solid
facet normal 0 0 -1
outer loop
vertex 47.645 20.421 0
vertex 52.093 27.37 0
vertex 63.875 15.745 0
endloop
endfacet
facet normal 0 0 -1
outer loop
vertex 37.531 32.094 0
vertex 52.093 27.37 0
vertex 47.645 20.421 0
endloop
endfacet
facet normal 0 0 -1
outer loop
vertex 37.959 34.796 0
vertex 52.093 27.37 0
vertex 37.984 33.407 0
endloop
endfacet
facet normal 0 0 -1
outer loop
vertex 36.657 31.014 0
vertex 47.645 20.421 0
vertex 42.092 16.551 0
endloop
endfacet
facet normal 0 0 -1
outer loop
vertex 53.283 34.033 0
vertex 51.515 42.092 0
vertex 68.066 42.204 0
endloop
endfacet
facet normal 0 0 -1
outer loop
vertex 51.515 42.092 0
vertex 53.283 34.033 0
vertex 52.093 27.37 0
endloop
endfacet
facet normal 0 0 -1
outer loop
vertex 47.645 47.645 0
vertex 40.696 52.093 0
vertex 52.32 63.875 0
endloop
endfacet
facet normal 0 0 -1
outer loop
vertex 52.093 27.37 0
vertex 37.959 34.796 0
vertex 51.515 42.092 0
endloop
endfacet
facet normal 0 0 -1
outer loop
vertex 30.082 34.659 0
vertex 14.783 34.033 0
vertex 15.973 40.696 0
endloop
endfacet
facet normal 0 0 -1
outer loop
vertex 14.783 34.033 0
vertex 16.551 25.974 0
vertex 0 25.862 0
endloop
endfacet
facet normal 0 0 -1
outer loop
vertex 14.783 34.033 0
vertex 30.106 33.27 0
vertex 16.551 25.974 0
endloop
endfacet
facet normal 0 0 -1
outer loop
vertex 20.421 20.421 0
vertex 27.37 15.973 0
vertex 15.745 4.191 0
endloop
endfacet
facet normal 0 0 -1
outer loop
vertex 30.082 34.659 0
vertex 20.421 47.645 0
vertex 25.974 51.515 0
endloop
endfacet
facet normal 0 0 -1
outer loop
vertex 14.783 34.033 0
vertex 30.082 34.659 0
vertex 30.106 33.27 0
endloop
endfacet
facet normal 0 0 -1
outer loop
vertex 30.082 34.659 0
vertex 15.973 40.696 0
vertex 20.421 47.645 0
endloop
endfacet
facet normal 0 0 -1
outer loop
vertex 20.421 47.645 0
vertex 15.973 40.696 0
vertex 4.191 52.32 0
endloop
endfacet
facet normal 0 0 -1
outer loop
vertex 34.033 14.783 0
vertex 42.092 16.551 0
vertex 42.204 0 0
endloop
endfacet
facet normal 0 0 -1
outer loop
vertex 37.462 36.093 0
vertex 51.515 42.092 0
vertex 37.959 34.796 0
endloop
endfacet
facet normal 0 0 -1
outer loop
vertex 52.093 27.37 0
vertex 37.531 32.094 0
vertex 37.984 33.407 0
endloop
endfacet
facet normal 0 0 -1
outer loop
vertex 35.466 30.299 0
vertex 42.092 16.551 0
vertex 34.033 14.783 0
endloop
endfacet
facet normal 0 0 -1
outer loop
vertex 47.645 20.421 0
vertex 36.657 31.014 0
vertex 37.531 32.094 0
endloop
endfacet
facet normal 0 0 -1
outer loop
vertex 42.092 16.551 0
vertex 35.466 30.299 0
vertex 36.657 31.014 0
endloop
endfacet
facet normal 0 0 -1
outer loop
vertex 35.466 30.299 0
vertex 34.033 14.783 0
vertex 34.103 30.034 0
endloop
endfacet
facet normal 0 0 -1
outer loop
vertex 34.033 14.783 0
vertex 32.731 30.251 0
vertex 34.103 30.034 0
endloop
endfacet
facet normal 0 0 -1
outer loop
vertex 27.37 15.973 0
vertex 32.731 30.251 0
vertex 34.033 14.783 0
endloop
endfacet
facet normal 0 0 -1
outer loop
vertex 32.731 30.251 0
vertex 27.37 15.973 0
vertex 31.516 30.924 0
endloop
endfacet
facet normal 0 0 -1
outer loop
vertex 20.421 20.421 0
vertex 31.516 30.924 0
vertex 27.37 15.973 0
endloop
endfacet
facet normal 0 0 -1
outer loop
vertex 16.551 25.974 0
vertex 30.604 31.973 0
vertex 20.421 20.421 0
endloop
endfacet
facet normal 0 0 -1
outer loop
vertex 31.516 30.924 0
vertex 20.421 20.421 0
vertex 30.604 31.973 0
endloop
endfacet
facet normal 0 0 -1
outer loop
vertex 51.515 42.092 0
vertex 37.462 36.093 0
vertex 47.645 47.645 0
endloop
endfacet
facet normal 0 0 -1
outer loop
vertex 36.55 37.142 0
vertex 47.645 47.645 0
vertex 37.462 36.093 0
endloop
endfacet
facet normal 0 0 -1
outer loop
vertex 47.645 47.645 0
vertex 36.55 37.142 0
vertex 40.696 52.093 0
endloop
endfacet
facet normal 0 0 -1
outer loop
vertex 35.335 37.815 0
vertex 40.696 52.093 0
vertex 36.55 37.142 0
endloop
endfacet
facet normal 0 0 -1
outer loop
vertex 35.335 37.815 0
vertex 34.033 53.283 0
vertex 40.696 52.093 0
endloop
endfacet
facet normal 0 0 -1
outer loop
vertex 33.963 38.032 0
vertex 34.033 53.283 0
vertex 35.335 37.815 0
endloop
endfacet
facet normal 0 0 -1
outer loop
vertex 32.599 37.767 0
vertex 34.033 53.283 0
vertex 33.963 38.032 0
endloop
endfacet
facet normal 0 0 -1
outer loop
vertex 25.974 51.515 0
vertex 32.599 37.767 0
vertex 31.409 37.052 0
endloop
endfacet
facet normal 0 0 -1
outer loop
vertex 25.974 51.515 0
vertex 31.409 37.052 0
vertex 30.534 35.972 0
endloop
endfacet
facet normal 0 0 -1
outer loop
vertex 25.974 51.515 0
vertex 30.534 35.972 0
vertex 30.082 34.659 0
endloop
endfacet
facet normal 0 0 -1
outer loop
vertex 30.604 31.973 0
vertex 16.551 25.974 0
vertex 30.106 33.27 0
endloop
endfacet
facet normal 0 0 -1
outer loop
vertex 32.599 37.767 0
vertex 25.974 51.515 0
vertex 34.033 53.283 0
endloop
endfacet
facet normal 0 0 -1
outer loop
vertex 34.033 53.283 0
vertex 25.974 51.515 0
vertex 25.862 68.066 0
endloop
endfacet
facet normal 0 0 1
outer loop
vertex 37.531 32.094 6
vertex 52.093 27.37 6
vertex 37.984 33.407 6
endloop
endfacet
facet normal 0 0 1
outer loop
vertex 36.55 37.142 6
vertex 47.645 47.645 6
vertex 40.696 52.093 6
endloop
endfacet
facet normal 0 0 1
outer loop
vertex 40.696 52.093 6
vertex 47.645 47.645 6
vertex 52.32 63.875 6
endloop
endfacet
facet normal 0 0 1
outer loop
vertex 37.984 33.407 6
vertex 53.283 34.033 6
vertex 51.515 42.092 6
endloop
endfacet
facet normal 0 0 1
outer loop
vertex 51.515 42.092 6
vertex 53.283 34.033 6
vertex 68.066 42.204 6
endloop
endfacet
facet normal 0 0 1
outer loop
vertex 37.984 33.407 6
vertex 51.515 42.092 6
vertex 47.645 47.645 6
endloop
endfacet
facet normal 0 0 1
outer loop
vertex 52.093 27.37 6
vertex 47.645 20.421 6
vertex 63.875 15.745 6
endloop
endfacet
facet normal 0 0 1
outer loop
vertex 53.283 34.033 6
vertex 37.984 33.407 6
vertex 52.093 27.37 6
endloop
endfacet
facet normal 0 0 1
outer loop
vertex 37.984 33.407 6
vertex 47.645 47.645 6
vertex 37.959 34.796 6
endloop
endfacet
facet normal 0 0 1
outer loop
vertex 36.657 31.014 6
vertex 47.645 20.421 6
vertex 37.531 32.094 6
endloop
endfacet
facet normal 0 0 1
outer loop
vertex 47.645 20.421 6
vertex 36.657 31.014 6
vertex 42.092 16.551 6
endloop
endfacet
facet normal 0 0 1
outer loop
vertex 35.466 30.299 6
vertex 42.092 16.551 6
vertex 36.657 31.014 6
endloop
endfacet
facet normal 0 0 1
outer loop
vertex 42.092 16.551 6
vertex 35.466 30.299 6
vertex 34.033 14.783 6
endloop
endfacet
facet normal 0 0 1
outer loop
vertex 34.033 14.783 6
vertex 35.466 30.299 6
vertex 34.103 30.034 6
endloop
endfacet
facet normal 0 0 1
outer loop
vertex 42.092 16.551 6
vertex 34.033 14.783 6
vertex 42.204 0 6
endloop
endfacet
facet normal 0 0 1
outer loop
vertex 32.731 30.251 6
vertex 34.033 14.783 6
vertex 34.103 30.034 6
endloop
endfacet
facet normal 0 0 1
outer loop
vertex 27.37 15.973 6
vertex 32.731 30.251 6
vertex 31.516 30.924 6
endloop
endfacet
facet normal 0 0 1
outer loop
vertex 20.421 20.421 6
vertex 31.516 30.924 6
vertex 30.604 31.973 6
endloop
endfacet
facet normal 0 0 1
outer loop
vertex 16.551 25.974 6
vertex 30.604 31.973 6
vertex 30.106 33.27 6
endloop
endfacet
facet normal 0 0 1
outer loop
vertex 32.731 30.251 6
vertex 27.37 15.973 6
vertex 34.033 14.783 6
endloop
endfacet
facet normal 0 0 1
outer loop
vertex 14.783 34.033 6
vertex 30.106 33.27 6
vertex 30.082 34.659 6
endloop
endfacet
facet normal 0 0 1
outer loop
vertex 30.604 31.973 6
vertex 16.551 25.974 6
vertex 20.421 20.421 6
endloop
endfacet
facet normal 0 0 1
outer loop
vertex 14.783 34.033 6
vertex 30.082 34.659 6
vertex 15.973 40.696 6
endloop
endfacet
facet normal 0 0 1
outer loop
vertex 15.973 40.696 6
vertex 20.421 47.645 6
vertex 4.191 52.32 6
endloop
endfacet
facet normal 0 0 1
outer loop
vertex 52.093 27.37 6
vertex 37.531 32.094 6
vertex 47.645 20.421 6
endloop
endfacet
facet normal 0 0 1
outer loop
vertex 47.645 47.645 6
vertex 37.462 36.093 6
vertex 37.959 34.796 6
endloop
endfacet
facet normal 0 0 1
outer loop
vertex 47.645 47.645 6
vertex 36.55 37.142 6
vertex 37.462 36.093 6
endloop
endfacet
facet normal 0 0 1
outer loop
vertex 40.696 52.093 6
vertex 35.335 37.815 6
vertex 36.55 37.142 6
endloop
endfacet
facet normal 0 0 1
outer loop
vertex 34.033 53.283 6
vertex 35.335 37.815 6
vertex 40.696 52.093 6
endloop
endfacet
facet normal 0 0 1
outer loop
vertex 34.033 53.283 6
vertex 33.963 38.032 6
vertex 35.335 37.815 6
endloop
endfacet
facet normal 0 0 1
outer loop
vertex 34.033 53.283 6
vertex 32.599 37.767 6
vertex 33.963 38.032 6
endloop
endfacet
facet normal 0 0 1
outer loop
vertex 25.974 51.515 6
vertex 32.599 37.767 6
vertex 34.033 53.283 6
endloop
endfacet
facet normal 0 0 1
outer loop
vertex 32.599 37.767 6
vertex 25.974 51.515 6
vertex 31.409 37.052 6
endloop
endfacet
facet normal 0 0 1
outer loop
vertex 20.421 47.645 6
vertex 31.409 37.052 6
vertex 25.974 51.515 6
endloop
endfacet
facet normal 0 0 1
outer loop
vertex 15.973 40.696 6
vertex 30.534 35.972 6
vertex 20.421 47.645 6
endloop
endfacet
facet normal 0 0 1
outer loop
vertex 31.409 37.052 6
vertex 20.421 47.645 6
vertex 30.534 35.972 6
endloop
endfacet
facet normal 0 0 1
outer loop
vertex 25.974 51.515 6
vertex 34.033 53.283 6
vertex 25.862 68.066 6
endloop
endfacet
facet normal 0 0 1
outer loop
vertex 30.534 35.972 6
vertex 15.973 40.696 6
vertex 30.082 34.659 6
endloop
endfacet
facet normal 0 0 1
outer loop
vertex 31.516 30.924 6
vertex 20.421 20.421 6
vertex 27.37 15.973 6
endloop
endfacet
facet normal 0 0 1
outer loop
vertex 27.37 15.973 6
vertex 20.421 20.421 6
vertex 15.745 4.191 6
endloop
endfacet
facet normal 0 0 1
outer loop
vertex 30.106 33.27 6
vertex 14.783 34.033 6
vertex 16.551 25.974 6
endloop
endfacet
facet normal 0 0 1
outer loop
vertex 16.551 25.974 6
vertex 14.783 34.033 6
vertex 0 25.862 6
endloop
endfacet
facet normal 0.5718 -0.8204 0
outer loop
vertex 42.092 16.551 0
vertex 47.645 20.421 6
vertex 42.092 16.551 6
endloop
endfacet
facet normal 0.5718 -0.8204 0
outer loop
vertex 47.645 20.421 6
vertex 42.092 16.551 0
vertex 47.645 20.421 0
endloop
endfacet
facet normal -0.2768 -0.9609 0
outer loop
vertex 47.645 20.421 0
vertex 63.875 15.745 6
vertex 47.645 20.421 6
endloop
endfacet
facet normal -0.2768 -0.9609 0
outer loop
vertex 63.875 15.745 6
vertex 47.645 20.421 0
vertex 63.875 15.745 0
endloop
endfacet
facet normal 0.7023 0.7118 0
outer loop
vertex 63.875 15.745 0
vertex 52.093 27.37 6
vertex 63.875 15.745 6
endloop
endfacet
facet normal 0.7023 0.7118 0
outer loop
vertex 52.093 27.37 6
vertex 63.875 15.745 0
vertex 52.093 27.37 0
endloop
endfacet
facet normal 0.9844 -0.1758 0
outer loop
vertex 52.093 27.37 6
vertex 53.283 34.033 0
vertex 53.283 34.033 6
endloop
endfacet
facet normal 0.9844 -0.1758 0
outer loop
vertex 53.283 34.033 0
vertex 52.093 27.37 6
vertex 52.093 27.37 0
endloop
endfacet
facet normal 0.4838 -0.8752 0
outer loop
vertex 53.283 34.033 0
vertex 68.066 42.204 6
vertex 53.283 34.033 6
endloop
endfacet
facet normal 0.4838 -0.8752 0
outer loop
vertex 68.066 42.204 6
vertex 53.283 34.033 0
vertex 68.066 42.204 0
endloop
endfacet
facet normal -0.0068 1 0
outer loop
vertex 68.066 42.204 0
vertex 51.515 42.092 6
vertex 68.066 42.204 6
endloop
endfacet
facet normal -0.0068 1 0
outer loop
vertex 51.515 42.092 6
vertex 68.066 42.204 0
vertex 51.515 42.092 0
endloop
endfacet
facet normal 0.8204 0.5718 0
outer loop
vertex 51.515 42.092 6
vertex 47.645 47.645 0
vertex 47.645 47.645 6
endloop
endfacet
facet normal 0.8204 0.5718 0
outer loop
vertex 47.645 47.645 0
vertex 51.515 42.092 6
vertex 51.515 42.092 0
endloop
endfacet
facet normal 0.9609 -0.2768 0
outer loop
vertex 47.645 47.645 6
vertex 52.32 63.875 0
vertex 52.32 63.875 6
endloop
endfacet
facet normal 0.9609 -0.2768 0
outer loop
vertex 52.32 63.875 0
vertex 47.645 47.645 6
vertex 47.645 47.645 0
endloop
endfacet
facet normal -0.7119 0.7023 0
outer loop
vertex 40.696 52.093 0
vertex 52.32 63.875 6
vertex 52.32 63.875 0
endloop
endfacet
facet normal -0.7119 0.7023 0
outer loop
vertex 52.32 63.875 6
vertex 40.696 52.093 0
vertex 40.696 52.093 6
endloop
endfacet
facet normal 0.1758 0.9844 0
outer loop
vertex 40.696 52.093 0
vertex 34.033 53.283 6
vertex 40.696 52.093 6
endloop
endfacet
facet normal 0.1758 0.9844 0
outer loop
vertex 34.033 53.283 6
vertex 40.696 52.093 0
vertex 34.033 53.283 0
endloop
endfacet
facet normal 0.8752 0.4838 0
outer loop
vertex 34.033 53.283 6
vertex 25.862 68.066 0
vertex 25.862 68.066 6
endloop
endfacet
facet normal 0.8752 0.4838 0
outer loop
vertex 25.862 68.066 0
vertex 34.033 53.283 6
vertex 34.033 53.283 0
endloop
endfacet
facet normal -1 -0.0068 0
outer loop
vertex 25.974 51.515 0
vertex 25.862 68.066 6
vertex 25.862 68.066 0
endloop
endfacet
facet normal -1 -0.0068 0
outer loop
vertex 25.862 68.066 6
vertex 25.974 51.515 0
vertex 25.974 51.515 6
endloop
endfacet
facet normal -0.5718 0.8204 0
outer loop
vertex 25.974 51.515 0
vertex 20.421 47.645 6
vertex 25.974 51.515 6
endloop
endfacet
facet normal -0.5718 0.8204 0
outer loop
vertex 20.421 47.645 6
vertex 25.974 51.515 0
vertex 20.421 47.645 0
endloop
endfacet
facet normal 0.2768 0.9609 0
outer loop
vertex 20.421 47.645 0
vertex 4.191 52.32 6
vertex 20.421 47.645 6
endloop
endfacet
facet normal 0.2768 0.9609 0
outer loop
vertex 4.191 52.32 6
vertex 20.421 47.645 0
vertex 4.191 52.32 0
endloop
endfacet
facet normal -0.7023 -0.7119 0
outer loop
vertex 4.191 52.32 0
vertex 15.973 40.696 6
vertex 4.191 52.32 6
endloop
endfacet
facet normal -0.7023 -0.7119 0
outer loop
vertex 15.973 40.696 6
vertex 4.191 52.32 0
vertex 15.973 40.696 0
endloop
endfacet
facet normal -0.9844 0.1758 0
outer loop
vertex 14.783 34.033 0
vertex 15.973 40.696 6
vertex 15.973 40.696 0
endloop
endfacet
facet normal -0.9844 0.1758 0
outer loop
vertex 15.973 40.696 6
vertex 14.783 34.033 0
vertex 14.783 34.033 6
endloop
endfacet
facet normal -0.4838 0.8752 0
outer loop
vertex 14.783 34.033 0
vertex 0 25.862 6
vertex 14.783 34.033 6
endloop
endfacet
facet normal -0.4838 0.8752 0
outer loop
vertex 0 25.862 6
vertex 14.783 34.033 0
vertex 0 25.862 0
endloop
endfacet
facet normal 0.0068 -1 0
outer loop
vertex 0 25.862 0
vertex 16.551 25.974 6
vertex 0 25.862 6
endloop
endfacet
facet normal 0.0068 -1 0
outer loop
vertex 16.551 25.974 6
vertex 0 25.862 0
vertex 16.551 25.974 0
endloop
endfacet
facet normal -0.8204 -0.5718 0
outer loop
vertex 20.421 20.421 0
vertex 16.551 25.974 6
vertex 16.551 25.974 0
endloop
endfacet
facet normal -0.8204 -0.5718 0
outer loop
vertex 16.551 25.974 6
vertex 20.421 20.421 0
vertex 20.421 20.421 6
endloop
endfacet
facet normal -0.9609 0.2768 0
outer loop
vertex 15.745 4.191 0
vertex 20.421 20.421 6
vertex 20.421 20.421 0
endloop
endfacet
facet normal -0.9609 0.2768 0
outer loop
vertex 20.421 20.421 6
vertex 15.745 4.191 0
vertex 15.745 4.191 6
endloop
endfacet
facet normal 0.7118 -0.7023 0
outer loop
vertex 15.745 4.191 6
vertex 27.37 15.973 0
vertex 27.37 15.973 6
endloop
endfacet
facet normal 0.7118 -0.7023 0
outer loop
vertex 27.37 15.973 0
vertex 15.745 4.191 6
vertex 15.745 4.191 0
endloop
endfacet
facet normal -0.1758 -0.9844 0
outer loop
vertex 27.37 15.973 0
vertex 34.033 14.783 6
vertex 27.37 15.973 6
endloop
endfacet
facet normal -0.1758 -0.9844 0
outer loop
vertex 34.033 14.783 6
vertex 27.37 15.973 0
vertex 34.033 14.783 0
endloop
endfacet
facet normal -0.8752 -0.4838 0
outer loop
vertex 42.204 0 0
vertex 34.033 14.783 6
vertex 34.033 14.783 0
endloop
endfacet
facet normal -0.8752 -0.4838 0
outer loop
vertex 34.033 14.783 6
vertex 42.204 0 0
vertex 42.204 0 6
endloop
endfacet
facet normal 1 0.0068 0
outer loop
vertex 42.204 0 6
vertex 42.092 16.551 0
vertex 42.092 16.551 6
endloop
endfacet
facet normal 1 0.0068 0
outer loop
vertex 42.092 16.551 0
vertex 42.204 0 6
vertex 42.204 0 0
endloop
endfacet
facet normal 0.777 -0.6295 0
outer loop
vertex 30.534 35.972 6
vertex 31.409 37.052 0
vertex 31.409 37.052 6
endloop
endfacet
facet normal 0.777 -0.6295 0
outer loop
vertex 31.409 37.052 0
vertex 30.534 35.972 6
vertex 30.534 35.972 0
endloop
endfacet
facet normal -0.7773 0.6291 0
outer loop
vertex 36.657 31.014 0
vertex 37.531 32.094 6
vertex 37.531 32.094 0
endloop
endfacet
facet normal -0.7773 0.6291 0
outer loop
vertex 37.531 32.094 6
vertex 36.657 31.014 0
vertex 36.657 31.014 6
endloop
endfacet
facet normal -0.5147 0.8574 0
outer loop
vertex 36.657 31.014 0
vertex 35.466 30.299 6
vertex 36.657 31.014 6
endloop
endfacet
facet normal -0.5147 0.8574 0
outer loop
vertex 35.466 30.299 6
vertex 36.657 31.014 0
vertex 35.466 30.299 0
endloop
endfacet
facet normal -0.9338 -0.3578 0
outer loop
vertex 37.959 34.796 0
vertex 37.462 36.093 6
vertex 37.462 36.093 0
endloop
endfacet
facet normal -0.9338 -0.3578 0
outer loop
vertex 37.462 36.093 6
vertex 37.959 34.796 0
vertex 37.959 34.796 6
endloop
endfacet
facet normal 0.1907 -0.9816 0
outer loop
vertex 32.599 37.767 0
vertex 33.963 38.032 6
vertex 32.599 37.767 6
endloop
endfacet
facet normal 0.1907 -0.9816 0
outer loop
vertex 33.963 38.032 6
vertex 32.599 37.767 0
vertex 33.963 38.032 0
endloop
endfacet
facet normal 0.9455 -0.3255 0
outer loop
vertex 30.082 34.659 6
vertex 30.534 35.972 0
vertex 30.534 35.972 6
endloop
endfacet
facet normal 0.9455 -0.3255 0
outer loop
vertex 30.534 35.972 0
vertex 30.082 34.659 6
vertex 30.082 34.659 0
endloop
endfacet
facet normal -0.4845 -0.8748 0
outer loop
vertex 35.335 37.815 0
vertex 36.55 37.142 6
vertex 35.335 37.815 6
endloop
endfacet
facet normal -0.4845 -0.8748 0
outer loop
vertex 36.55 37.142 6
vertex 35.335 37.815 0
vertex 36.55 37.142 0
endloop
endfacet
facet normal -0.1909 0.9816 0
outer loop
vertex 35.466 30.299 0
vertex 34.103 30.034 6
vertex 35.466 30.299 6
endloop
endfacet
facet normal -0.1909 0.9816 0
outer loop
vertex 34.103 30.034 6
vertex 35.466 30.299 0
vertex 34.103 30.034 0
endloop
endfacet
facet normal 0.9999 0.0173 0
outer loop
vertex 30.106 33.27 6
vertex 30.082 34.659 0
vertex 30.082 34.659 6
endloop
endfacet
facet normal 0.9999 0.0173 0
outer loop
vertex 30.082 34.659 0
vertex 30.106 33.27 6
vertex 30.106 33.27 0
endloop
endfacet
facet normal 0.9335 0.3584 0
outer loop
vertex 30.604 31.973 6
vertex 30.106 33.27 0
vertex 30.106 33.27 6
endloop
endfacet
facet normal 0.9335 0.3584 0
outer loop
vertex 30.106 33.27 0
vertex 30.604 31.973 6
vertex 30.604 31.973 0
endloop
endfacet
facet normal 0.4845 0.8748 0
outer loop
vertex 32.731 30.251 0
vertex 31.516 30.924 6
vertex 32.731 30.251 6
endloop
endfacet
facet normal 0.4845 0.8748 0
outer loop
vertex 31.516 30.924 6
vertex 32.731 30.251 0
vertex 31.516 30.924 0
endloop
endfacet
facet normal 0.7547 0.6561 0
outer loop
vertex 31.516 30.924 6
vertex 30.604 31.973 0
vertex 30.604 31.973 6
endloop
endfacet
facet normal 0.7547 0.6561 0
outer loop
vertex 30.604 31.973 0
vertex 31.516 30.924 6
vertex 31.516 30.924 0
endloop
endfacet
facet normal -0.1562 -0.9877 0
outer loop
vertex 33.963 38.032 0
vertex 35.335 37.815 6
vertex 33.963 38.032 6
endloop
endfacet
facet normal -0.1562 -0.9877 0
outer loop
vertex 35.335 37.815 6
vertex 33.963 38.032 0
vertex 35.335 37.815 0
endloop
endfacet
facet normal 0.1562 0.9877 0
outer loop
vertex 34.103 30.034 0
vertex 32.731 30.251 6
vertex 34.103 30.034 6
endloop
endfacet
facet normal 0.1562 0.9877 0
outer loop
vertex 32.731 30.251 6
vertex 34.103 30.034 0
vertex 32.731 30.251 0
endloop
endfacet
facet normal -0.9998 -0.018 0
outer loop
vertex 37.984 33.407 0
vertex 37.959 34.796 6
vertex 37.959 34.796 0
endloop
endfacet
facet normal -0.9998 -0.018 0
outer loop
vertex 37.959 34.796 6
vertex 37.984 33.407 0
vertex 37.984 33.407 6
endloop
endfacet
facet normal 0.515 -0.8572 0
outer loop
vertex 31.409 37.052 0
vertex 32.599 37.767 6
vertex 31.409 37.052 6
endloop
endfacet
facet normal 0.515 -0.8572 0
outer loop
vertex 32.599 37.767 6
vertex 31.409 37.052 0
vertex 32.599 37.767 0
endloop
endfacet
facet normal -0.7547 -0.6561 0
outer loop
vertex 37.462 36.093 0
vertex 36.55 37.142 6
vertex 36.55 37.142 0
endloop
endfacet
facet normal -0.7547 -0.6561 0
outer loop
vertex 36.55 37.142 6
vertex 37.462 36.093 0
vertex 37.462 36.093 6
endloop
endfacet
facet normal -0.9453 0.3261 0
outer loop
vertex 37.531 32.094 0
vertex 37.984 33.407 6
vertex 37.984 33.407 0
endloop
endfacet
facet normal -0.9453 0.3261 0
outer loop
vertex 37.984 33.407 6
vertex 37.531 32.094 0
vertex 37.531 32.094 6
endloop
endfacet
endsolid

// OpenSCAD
$fn = 32;

// ----------------------------------------------------------------------
// Star wheel: 8-point ratchet, R35
// ----------------------------------------------------------------------

// --- parameters (mm) ---
n_points = 8;             // number of points / teeth
r_out = 35;               // tip radius
r_in = 19.25;             // root radius
bore_r = 4;               // centre bore radius
plate_t = 6;              // plate thickness, Z (extrusion height)
bore_d = 8;               // centre bore diameter
fit_tol = 0.05;           // declared fit tolerance (prompt contract)
free_tol = 0.3;           // declared free tolerance (prompt contract)

profile = [[34.033, 53.283], [25.862, 68.066], [25.974, 51.515], [20.421, 47.645], [4.191, 52.32], [15.973, 40.696], [14.783, 34.033], [0, 25.862], [16.551, 25.974], [20.421, 20.421], [15.745, 4.191], [27.37, 15.973], [34.033, 14.783], [42.204, 0], [42.092, 16.551], [47.645, 20.421], [63.875, 15.745], [52.093, 27.37], [53.283, 34.033], [68.066, 42.204], [51.515, 42.092], [47.645, 47.645], [52.32, 63.875], [40.696, 52.093]];  // primary outline, 24 points, counter clockwise
void_1 = [[37.959, 34.796], [37.462, 36.093], [36.55, 37.142], [35.335, 37.815], [33.963, 38.032], [32.599, 37.767], [31.409, 37.052], [30.534, 35.972], [30.082, 34.659], [30.106, 33.27], [30.604, 31.973], [31.516, 30.924], [32.731, 30.251], [34.103, 30.034], [35.466, 30.299], [36.657, 31.014], [37.531, 32.094], [37.984, 33.407]];  // centre bore, 18 points

// --- the one profile operation ---
difference() {
  linear_extrude(height = plate_t) polygon(points = profile);
  translate([0, 0, -1])
    linear_extrude(height = plate_t + 2) polygon(points = void_1);
}
